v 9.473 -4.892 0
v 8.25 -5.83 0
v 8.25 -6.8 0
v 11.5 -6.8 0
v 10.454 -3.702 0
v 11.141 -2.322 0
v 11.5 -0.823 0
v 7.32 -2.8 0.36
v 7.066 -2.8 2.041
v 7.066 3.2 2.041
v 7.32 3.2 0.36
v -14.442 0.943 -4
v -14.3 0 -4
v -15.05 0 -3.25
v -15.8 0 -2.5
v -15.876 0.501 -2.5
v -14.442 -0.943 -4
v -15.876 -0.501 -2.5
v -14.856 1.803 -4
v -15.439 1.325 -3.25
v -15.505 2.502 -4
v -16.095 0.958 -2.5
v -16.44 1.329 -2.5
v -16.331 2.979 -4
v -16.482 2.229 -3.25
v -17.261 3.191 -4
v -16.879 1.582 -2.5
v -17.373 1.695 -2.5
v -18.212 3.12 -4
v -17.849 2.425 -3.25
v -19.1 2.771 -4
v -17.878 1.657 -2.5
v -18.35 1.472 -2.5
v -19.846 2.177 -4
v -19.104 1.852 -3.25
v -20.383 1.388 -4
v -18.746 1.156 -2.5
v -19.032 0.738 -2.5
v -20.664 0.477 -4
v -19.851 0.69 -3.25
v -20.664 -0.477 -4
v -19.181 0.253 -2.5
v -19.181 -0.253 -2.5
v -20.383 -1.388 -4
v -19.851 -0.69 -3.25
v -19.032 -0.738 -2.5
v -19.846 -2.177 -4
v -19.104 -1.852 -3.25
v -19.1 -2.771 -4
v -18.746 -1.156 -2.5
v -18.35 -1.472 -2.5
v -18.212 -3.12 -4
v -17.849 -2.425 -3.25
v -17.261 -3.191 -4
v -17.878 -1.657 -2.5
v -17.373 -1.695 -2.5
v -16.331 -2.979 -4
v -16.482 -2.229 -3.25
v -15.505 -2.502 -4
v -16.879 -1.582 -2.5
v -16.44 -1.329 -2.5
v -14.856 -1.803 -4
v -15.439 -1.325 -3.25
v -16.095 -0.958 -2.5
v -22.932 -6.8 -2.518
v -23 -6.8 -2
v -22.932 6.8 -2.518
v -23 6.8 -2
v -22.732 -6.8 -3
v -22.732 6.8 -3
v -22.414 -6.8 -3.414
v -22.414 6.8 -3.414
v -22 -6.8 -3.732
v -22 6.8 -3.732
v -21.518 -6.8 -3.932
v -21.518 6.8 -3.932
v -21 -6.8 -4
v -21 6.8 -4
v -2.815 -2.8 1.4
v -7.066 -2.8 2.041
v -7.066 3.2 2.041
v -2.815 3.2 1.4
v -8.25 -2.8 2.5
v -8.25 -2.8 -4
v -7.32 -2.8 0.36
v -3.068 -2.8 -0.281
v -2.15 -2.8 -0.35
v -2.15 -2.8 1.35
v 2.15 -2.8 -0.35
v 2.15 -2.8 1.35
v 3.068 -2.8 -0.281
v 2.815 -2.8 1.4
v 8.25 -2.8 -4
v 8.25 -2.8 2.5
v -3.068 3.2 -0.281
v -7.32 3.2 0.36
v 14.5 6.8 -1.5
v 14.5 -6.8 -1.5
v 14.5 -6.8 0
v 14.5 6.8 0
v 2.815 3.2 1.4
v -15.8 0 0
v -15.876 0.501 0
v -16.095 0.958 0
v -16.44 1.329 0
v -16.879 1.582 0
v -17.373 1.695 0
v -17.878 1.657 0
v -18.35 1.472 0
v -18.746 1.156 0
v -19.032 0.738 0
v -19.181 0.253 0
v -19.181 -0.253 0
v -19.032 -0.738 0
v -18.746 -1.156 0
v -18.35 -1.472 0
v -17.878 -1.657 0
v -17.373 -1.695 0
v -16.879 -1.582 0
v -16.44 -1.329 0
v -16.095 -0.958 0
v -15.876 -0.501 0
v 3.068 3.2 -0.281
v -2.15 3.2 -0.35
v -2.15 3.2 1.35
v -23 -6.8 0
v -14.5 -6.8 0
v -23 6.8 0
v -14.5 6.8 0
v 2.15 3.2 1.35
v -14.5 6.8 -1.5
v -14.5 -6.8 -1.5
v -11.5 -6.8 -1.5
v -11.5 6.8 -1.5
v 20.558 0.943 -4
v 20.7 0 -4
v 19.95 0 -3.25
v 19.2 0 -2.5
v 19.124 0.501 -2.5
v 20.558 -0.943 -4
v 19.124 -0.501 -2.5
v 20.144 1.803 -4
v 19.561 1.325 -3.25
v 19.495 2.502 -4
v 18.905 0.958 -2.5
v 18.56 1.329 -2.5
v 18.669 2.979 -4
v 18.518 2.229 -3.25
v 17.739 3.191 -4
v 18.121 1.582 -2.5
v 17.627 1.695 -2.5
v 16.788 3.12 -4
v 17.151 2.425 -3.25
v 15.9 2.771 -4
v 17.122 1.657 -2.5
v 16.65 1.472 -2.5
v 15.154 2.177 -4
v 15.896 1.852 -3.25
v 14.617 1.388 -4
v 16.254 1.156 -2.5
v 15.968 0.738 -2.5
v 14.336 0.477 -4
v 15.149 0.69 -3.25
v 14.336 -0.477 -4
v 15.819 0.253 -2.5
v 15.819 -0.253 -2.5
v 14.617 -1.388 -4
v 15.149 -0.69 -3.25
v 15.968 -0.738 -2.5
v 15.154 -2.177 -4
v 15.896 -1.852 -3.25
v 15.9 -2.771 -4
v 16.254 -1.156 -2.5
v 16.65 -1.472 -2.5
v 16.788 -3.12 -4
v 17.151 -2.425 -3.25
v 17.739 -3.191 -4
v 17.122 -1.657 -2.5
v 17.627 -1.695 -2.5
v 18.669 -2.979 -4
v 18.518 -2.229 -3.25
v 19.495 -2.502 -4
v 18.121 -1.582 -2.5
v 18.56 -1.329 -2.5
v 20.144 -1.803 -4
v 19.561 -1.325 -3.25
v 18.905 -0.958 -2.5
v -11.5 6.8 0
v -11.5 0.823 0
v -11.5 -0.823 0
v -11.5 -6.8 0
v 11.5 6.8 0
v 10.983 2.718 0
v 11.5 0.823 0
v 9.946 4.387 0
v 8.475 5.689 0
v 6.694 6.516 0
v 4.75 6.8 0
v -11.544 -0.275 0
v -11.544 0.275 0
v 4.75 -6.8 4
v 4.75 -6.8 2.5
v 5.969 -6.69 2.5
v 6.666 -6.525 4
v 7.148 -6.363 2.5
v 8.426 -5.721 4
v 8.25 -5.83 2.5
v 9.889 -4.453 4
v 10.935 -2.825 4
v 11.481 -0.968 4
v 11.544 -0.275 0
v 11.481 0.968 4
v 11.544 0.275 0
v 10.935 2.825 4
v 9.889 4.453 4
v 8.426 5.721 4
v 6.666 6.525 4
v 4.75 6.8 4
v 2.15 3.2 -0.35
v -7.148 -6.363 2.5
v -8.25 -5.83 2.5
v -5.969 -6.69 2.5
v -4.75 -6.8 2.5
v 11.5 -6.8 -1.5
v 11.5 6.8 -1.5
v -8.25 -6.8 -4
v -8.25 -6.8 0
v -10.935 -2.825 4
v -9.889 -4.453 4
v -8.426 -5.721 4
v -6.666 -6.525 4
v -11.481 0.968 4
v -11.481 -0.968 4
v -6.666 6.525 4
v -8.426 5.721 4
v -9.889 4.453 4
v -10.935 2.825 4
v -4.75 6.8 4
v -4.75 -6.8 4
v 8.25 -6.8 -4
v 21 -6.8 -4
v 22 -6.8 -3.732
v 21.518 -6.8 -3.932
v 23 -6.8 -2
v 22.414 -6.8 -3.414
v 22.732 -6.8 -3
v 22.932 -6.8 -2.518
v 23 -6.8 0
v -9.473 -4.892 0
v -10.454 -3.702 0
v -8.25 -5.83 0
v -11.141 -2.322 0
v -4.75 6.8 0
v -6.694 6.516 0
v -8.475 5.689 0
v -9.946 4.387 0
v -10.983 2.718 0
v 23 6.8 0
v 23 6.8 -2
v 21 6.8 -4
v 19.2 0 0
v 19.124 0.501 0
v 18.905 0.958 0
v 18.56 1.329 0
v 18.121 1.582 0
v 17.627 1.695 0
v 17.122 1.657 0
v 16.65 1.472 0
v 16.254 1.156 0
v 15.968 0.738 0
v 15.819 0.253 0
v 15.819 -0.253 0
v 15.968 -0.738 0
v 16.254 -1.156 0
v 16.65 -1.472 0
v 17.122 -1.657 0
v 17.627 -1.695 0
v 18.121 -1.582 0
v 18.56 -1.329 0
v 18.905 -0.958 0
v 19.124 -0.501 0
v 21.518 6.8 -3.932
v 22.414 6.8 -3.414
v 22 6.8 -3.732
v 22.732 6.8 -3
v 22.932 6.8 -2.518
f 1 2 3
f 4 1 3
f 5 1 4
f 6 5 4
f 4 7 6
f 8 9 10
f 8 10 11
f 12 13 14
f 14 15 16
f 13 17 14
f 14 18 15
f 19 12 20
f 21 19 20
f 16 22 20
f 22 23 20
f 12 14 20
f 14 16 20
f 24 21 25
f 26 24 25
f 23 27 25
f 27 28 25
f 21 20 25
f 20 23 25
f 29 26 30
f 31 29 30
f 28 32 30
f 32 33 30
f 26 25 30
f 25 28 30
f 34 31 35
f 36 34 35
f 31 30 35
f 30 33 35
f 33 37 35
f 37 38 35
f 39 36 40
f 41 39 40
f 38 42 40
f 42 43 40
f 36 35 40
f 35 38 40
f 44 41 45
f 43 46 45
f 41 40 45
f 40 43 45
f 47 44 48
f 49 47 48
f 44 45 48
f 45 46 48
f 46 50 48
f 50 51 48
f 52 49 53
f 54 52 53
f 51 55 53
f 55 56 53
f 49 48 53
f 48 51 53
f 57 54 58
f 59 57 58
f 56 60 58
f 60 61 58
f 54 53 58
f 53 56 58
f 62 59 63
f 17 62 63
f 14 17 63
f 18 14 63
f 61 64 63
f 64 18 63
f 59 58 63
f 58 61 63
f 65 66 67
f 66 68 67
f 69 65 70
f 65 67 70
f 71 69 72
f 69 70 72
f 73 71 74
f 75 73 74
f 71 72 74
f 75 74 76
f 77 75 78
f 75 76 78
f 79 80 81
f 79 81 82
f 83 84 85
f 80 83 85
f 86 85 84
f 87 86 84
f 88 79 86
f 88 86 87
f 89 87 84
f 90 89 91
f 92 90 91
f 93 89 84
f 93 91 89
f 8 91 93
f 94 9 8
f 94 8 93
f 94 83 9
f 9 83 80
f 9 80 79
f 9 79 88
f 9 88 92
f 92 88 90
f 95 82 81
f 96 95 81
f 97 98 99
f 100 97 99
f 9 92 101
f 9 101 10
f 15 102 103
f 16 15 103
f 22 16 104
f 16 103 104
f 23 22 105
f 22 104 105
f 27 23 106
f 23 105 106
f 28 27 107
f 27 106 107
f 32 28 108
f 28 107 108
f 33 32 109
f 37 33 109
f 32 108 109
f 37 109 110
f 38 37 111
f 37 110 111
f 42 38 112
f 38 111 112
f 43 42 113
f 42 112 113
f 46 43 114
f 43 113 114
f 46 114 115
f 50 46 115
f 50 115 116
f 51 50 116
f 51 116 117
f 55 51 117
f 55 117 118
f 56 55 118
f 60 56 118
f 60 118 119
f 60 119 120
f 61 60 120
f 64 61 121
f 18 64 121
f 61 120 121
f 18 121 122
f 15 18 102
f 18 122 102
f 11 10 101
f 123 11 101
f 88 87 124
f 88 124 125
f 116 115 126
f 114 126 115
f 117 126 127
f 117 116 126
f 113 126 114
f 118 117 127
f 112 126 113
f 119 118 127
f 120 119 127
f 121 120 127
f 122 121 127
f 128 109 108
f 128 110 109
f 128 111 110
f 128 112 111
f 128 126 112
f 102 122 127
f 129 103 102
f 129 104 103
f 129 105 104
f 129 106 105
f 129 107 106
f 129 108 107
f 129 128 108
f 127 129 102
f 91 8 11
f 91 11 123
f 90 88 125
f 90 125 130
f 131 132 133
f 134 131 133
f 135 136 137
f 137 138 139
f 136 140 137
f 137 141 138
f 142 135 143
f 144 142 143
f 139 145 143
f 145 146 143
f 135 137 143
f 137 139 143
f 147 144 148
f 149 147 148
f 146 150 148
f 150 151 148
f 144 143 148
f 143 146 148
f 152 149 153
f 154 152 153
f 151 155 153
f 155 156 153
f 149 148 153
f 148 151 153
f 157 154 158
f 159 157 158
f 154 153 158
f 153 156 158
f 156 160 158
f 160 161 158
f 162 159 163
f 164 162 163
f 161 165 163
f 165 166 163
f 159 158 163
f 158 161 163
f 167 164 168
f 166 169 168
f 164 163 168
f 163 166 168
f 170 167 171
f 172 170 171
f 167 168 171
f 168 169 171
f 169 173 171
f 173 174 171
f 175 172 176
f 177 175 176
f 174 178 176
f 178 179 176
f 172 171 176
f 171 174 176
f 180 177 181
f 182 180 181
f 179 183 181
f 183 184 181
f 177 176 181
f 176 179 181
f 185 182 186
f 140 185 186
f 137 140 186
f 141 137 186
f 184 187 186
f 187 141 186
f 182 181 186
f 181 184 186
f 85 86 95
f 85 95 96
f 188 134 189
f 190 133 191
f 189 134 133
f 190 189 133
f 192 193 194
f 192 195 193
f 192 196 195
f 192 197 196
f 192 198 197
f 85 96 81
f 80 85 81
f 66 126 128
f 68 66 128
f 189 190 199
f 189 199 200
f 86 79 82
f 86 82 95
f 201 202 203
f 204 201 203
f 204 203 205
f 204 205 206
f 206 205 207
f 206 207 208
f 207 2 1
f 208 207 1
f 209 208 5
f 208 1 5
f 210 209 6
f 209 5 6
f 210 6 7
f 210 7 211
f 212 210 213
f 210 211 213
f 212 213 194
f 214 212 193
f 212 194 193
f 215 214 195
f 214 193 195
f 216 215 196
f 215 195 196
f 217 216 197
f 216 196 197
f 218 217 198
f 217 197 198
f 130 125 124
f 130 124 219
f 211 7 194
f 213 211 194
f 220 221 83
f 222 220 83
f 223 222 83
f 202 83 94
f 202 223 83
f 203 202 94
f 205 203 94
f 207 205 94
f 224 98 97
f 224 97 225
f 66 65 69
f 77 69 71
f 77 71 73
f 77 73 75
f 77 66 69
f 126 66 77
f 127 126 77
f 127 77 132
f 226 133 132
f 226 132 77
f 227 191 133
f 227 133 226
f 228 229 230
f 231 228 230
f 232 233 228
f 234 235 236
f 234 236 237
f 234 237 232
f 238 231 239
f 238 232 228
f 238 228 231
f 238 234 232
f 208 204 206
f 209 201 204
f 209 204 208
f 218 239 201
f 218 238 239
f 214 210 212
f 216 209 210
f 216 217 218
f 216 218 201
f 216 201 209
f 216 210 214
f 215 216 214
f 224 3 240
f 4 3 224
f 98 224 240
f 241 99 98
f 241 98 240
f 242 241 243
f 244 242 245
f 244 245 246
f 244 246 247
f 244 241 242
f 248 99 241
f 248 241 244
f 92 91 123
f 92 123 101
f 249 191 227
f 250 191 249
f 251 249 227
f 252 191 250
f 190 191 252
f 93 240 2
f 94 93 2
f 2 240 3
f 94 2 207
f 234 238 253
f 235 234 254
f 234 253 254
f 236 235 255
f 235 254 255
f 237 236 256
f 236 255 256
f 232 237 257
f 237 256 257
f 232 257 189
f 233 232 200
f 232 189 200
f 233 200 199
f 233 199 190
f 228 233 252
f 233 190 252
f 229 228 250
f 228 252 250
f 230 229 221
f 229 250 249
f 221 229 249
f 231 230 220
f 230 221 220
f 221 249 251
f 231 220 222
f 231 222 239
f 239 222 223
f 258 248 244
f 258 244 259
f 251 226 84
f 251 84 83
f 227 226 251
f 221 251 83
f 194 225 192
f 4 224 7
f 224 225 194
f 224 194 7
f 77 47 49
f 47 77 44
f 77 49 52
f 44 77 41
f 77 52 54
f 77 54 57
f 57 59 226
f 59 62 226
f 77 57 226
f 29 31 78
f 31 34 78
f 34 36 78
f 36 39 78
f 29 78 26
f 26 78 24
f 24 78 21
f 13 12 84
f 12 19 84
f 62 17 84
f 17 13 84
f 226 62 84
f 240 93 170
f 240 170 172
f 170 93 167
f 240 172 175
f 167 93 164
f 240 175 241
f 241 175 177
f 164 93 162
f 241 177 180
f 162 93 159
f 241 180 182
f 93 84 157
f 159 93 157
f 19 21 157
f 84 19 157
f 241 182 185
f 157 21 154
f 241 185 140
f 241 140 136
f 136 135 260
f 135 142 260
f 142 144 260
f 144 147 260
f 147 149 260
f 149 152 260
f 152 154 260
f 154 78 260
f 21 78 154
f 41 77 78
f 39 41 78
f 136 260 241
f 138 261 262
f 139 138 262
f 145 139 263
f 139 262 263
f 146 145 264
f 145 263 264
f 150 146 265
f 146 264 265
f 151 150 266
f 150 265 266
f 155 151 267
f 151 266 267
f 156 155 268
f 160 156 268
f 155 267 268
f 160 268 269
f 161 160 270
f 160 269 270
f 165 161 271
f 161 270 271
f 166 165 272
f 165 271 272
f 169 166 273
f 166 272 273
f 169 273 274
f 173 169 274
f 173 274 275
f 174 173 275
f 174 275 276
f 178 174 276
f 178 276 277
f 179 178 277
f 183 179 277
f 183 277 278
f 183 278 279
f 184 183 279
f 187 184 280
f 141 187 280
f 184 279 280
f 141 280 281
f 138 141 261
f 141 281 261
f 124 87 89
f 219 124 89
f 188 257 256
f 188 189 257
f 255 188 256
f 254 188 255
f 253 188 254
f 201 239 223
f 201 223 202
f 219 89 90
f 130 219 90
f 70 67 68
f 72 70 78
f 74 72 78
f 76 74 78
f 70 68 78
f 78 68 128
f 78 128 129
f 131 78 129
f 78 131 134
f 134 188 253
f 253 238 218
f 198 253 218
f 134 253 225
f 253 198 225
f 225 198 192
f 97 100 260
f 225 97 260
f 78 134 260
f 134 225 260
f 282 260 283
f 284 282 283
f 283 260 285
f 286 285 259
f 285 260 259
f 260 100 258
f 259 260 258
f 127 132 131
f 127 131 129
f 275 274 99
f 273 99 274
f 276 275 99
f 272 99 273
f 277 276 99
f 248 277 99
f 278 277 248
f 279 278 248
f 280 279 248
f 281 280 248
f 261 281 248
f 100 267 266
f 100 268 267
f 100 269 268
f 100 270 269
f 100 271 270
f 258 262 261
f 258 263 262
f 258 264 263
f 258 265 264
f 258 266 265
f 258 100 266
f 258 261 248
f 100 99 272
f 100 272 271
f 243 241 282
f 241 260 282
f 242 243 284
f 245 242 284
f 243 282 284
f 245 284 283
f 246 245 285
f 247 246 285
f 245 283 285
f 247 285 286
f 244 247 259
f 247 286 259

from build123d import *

# Parameters (mm, degrees)
SKETCH_W        = 46
SKETCH_H        = 13.6
SKETCH_R        = 1.7
PAD_DEPTH       = 4
PAD001_DEPTH    = 4
SKETCH002_W     = 4.3
SKETCH002_H     = 1.7
POCKET_DEPTH    = 10
SKETCH003_W     = 16.5
SKETCH003_H     = 7.2
POCKET001_DEPTH = 4
SKETCH004_W     = 3
SKETCH004_H     = 1.5
POCKET002_DEPTH = 110.862709
FILLET_R        = 2
FILLET001_R     = 2
CHAMFER_SIZE    = 1.5
CHAMFER001_SIZE = 1.5


with BuildPart() as part:
    # Sketch → Pad (new body)
    with BuildSketch(Plane.XY):
        Rectangle(SKETCH_W, SKETCH_H)
        with Locations((-17.5, 0)):
            Circle(SKETCH_R, mode=Mode.SUBTRACT)
        with Locations((17.5, 0)):
            Circle(SKETCH_R, mode=Mode.SUBTRACT)
    extrude(amount=-PAD_DEPTH)

    # Sketch001 → Pad001 (new body)
    with BuildSketch(Plane.XY):
        with BuildLine():
            ThreePointArc((-4.75, 6.8), (-11.55, 0), (-4.75, -6.8))
            Line((-4.75, -6.8), (4.75, -6.8))
            ThreePointArc((4.75, -6.8), (11.55, 0), (4.75, 6.8))
            Line((-4.75, 6.8), (4.75, 6.8))
        make_face()
    extrude(amount=PAD001_DEPTH)

    # Sketch002 → Pocket (cut)
    with BuildSketch(Plane.XZ.offset(6.8)):
        Polygon((-7.066496, 2.040643), (-2.814518, 1.399799), (-3.067875, -0.281215), (-7.319853, 0.359629), align=None)
        with Locations((0, 0.5)):
            Rectangle(SKETCH002_W, SKETCH002_H)
        Polygon((2.814518, 1.399799), (7.066496, 2.040644), (7.319853, 0.359629), (3.067875, -0.281216), align=None)
    extrude(amount=-POCKET_DEPTH, mode=Mode.SUBTRACT)

    # Sketch003 → Pocket001 (cut)
    with BuildSketch(Plane.XZ.offset(6.8)):
        with Locations((0, -1.1)):
            Rectangle(SKETCH003_W, SKETCH003_H)
    extrude(amount=-POCKET001_DEPTH, mode=Mode.SUBTRACT)

    # Sketch004 → Pocket002 (cut, through all)
    with BuildSketch(Plane.XZ.offset(6.8)):
        with Locations((-13, -0.75)):
            Rectangle(SKETCH004_W, SKETCH004_H)
    pocket002 = extrude(amount=-POCKET002_DEPTH, mode=Mode.SUBTRACT)

    # Mirrored: Pocket002 across Sketch004 V_Axis
    add(pocket002.mirror(Plane(origin=(0, -6.8, 0), x_dir=(0, -1, 0), z_dir=(1, 0, 0))), mode=Mode.SUBTRACT)

    # Fillet
    fillet_edges = [part.edges().sort_by_distance(p)[0] for p in [
        (-23, 0, -4),
    ]]
    fillet(fillet_edges, radius=FILLET_R)

    # Fillet001
    fillet001_edges = [part.edges().sort_by_distance(p)[0] for p in [
        (23, 0, -4),
    ]]
    fillet(fillet001_edges, radius=FILLET001_R)

    # Chamfer
    chamfer_edges = [part.edges().sort_by_distance(p)[0] for p in [
        (-19.2, 0, -4),
    ]]
    chamfer(chamfer_edges, length=CHAMFER_SIZE)

    # Chamfer001
    chamfer001_edges = [part.edges().sort_by_distance(p)[0] for p in [
        (15.8, 0, -4),
    ]]
    chamfer(chamfer001_edges, length=CHAMFER001_SIZE)


solid = part.part
